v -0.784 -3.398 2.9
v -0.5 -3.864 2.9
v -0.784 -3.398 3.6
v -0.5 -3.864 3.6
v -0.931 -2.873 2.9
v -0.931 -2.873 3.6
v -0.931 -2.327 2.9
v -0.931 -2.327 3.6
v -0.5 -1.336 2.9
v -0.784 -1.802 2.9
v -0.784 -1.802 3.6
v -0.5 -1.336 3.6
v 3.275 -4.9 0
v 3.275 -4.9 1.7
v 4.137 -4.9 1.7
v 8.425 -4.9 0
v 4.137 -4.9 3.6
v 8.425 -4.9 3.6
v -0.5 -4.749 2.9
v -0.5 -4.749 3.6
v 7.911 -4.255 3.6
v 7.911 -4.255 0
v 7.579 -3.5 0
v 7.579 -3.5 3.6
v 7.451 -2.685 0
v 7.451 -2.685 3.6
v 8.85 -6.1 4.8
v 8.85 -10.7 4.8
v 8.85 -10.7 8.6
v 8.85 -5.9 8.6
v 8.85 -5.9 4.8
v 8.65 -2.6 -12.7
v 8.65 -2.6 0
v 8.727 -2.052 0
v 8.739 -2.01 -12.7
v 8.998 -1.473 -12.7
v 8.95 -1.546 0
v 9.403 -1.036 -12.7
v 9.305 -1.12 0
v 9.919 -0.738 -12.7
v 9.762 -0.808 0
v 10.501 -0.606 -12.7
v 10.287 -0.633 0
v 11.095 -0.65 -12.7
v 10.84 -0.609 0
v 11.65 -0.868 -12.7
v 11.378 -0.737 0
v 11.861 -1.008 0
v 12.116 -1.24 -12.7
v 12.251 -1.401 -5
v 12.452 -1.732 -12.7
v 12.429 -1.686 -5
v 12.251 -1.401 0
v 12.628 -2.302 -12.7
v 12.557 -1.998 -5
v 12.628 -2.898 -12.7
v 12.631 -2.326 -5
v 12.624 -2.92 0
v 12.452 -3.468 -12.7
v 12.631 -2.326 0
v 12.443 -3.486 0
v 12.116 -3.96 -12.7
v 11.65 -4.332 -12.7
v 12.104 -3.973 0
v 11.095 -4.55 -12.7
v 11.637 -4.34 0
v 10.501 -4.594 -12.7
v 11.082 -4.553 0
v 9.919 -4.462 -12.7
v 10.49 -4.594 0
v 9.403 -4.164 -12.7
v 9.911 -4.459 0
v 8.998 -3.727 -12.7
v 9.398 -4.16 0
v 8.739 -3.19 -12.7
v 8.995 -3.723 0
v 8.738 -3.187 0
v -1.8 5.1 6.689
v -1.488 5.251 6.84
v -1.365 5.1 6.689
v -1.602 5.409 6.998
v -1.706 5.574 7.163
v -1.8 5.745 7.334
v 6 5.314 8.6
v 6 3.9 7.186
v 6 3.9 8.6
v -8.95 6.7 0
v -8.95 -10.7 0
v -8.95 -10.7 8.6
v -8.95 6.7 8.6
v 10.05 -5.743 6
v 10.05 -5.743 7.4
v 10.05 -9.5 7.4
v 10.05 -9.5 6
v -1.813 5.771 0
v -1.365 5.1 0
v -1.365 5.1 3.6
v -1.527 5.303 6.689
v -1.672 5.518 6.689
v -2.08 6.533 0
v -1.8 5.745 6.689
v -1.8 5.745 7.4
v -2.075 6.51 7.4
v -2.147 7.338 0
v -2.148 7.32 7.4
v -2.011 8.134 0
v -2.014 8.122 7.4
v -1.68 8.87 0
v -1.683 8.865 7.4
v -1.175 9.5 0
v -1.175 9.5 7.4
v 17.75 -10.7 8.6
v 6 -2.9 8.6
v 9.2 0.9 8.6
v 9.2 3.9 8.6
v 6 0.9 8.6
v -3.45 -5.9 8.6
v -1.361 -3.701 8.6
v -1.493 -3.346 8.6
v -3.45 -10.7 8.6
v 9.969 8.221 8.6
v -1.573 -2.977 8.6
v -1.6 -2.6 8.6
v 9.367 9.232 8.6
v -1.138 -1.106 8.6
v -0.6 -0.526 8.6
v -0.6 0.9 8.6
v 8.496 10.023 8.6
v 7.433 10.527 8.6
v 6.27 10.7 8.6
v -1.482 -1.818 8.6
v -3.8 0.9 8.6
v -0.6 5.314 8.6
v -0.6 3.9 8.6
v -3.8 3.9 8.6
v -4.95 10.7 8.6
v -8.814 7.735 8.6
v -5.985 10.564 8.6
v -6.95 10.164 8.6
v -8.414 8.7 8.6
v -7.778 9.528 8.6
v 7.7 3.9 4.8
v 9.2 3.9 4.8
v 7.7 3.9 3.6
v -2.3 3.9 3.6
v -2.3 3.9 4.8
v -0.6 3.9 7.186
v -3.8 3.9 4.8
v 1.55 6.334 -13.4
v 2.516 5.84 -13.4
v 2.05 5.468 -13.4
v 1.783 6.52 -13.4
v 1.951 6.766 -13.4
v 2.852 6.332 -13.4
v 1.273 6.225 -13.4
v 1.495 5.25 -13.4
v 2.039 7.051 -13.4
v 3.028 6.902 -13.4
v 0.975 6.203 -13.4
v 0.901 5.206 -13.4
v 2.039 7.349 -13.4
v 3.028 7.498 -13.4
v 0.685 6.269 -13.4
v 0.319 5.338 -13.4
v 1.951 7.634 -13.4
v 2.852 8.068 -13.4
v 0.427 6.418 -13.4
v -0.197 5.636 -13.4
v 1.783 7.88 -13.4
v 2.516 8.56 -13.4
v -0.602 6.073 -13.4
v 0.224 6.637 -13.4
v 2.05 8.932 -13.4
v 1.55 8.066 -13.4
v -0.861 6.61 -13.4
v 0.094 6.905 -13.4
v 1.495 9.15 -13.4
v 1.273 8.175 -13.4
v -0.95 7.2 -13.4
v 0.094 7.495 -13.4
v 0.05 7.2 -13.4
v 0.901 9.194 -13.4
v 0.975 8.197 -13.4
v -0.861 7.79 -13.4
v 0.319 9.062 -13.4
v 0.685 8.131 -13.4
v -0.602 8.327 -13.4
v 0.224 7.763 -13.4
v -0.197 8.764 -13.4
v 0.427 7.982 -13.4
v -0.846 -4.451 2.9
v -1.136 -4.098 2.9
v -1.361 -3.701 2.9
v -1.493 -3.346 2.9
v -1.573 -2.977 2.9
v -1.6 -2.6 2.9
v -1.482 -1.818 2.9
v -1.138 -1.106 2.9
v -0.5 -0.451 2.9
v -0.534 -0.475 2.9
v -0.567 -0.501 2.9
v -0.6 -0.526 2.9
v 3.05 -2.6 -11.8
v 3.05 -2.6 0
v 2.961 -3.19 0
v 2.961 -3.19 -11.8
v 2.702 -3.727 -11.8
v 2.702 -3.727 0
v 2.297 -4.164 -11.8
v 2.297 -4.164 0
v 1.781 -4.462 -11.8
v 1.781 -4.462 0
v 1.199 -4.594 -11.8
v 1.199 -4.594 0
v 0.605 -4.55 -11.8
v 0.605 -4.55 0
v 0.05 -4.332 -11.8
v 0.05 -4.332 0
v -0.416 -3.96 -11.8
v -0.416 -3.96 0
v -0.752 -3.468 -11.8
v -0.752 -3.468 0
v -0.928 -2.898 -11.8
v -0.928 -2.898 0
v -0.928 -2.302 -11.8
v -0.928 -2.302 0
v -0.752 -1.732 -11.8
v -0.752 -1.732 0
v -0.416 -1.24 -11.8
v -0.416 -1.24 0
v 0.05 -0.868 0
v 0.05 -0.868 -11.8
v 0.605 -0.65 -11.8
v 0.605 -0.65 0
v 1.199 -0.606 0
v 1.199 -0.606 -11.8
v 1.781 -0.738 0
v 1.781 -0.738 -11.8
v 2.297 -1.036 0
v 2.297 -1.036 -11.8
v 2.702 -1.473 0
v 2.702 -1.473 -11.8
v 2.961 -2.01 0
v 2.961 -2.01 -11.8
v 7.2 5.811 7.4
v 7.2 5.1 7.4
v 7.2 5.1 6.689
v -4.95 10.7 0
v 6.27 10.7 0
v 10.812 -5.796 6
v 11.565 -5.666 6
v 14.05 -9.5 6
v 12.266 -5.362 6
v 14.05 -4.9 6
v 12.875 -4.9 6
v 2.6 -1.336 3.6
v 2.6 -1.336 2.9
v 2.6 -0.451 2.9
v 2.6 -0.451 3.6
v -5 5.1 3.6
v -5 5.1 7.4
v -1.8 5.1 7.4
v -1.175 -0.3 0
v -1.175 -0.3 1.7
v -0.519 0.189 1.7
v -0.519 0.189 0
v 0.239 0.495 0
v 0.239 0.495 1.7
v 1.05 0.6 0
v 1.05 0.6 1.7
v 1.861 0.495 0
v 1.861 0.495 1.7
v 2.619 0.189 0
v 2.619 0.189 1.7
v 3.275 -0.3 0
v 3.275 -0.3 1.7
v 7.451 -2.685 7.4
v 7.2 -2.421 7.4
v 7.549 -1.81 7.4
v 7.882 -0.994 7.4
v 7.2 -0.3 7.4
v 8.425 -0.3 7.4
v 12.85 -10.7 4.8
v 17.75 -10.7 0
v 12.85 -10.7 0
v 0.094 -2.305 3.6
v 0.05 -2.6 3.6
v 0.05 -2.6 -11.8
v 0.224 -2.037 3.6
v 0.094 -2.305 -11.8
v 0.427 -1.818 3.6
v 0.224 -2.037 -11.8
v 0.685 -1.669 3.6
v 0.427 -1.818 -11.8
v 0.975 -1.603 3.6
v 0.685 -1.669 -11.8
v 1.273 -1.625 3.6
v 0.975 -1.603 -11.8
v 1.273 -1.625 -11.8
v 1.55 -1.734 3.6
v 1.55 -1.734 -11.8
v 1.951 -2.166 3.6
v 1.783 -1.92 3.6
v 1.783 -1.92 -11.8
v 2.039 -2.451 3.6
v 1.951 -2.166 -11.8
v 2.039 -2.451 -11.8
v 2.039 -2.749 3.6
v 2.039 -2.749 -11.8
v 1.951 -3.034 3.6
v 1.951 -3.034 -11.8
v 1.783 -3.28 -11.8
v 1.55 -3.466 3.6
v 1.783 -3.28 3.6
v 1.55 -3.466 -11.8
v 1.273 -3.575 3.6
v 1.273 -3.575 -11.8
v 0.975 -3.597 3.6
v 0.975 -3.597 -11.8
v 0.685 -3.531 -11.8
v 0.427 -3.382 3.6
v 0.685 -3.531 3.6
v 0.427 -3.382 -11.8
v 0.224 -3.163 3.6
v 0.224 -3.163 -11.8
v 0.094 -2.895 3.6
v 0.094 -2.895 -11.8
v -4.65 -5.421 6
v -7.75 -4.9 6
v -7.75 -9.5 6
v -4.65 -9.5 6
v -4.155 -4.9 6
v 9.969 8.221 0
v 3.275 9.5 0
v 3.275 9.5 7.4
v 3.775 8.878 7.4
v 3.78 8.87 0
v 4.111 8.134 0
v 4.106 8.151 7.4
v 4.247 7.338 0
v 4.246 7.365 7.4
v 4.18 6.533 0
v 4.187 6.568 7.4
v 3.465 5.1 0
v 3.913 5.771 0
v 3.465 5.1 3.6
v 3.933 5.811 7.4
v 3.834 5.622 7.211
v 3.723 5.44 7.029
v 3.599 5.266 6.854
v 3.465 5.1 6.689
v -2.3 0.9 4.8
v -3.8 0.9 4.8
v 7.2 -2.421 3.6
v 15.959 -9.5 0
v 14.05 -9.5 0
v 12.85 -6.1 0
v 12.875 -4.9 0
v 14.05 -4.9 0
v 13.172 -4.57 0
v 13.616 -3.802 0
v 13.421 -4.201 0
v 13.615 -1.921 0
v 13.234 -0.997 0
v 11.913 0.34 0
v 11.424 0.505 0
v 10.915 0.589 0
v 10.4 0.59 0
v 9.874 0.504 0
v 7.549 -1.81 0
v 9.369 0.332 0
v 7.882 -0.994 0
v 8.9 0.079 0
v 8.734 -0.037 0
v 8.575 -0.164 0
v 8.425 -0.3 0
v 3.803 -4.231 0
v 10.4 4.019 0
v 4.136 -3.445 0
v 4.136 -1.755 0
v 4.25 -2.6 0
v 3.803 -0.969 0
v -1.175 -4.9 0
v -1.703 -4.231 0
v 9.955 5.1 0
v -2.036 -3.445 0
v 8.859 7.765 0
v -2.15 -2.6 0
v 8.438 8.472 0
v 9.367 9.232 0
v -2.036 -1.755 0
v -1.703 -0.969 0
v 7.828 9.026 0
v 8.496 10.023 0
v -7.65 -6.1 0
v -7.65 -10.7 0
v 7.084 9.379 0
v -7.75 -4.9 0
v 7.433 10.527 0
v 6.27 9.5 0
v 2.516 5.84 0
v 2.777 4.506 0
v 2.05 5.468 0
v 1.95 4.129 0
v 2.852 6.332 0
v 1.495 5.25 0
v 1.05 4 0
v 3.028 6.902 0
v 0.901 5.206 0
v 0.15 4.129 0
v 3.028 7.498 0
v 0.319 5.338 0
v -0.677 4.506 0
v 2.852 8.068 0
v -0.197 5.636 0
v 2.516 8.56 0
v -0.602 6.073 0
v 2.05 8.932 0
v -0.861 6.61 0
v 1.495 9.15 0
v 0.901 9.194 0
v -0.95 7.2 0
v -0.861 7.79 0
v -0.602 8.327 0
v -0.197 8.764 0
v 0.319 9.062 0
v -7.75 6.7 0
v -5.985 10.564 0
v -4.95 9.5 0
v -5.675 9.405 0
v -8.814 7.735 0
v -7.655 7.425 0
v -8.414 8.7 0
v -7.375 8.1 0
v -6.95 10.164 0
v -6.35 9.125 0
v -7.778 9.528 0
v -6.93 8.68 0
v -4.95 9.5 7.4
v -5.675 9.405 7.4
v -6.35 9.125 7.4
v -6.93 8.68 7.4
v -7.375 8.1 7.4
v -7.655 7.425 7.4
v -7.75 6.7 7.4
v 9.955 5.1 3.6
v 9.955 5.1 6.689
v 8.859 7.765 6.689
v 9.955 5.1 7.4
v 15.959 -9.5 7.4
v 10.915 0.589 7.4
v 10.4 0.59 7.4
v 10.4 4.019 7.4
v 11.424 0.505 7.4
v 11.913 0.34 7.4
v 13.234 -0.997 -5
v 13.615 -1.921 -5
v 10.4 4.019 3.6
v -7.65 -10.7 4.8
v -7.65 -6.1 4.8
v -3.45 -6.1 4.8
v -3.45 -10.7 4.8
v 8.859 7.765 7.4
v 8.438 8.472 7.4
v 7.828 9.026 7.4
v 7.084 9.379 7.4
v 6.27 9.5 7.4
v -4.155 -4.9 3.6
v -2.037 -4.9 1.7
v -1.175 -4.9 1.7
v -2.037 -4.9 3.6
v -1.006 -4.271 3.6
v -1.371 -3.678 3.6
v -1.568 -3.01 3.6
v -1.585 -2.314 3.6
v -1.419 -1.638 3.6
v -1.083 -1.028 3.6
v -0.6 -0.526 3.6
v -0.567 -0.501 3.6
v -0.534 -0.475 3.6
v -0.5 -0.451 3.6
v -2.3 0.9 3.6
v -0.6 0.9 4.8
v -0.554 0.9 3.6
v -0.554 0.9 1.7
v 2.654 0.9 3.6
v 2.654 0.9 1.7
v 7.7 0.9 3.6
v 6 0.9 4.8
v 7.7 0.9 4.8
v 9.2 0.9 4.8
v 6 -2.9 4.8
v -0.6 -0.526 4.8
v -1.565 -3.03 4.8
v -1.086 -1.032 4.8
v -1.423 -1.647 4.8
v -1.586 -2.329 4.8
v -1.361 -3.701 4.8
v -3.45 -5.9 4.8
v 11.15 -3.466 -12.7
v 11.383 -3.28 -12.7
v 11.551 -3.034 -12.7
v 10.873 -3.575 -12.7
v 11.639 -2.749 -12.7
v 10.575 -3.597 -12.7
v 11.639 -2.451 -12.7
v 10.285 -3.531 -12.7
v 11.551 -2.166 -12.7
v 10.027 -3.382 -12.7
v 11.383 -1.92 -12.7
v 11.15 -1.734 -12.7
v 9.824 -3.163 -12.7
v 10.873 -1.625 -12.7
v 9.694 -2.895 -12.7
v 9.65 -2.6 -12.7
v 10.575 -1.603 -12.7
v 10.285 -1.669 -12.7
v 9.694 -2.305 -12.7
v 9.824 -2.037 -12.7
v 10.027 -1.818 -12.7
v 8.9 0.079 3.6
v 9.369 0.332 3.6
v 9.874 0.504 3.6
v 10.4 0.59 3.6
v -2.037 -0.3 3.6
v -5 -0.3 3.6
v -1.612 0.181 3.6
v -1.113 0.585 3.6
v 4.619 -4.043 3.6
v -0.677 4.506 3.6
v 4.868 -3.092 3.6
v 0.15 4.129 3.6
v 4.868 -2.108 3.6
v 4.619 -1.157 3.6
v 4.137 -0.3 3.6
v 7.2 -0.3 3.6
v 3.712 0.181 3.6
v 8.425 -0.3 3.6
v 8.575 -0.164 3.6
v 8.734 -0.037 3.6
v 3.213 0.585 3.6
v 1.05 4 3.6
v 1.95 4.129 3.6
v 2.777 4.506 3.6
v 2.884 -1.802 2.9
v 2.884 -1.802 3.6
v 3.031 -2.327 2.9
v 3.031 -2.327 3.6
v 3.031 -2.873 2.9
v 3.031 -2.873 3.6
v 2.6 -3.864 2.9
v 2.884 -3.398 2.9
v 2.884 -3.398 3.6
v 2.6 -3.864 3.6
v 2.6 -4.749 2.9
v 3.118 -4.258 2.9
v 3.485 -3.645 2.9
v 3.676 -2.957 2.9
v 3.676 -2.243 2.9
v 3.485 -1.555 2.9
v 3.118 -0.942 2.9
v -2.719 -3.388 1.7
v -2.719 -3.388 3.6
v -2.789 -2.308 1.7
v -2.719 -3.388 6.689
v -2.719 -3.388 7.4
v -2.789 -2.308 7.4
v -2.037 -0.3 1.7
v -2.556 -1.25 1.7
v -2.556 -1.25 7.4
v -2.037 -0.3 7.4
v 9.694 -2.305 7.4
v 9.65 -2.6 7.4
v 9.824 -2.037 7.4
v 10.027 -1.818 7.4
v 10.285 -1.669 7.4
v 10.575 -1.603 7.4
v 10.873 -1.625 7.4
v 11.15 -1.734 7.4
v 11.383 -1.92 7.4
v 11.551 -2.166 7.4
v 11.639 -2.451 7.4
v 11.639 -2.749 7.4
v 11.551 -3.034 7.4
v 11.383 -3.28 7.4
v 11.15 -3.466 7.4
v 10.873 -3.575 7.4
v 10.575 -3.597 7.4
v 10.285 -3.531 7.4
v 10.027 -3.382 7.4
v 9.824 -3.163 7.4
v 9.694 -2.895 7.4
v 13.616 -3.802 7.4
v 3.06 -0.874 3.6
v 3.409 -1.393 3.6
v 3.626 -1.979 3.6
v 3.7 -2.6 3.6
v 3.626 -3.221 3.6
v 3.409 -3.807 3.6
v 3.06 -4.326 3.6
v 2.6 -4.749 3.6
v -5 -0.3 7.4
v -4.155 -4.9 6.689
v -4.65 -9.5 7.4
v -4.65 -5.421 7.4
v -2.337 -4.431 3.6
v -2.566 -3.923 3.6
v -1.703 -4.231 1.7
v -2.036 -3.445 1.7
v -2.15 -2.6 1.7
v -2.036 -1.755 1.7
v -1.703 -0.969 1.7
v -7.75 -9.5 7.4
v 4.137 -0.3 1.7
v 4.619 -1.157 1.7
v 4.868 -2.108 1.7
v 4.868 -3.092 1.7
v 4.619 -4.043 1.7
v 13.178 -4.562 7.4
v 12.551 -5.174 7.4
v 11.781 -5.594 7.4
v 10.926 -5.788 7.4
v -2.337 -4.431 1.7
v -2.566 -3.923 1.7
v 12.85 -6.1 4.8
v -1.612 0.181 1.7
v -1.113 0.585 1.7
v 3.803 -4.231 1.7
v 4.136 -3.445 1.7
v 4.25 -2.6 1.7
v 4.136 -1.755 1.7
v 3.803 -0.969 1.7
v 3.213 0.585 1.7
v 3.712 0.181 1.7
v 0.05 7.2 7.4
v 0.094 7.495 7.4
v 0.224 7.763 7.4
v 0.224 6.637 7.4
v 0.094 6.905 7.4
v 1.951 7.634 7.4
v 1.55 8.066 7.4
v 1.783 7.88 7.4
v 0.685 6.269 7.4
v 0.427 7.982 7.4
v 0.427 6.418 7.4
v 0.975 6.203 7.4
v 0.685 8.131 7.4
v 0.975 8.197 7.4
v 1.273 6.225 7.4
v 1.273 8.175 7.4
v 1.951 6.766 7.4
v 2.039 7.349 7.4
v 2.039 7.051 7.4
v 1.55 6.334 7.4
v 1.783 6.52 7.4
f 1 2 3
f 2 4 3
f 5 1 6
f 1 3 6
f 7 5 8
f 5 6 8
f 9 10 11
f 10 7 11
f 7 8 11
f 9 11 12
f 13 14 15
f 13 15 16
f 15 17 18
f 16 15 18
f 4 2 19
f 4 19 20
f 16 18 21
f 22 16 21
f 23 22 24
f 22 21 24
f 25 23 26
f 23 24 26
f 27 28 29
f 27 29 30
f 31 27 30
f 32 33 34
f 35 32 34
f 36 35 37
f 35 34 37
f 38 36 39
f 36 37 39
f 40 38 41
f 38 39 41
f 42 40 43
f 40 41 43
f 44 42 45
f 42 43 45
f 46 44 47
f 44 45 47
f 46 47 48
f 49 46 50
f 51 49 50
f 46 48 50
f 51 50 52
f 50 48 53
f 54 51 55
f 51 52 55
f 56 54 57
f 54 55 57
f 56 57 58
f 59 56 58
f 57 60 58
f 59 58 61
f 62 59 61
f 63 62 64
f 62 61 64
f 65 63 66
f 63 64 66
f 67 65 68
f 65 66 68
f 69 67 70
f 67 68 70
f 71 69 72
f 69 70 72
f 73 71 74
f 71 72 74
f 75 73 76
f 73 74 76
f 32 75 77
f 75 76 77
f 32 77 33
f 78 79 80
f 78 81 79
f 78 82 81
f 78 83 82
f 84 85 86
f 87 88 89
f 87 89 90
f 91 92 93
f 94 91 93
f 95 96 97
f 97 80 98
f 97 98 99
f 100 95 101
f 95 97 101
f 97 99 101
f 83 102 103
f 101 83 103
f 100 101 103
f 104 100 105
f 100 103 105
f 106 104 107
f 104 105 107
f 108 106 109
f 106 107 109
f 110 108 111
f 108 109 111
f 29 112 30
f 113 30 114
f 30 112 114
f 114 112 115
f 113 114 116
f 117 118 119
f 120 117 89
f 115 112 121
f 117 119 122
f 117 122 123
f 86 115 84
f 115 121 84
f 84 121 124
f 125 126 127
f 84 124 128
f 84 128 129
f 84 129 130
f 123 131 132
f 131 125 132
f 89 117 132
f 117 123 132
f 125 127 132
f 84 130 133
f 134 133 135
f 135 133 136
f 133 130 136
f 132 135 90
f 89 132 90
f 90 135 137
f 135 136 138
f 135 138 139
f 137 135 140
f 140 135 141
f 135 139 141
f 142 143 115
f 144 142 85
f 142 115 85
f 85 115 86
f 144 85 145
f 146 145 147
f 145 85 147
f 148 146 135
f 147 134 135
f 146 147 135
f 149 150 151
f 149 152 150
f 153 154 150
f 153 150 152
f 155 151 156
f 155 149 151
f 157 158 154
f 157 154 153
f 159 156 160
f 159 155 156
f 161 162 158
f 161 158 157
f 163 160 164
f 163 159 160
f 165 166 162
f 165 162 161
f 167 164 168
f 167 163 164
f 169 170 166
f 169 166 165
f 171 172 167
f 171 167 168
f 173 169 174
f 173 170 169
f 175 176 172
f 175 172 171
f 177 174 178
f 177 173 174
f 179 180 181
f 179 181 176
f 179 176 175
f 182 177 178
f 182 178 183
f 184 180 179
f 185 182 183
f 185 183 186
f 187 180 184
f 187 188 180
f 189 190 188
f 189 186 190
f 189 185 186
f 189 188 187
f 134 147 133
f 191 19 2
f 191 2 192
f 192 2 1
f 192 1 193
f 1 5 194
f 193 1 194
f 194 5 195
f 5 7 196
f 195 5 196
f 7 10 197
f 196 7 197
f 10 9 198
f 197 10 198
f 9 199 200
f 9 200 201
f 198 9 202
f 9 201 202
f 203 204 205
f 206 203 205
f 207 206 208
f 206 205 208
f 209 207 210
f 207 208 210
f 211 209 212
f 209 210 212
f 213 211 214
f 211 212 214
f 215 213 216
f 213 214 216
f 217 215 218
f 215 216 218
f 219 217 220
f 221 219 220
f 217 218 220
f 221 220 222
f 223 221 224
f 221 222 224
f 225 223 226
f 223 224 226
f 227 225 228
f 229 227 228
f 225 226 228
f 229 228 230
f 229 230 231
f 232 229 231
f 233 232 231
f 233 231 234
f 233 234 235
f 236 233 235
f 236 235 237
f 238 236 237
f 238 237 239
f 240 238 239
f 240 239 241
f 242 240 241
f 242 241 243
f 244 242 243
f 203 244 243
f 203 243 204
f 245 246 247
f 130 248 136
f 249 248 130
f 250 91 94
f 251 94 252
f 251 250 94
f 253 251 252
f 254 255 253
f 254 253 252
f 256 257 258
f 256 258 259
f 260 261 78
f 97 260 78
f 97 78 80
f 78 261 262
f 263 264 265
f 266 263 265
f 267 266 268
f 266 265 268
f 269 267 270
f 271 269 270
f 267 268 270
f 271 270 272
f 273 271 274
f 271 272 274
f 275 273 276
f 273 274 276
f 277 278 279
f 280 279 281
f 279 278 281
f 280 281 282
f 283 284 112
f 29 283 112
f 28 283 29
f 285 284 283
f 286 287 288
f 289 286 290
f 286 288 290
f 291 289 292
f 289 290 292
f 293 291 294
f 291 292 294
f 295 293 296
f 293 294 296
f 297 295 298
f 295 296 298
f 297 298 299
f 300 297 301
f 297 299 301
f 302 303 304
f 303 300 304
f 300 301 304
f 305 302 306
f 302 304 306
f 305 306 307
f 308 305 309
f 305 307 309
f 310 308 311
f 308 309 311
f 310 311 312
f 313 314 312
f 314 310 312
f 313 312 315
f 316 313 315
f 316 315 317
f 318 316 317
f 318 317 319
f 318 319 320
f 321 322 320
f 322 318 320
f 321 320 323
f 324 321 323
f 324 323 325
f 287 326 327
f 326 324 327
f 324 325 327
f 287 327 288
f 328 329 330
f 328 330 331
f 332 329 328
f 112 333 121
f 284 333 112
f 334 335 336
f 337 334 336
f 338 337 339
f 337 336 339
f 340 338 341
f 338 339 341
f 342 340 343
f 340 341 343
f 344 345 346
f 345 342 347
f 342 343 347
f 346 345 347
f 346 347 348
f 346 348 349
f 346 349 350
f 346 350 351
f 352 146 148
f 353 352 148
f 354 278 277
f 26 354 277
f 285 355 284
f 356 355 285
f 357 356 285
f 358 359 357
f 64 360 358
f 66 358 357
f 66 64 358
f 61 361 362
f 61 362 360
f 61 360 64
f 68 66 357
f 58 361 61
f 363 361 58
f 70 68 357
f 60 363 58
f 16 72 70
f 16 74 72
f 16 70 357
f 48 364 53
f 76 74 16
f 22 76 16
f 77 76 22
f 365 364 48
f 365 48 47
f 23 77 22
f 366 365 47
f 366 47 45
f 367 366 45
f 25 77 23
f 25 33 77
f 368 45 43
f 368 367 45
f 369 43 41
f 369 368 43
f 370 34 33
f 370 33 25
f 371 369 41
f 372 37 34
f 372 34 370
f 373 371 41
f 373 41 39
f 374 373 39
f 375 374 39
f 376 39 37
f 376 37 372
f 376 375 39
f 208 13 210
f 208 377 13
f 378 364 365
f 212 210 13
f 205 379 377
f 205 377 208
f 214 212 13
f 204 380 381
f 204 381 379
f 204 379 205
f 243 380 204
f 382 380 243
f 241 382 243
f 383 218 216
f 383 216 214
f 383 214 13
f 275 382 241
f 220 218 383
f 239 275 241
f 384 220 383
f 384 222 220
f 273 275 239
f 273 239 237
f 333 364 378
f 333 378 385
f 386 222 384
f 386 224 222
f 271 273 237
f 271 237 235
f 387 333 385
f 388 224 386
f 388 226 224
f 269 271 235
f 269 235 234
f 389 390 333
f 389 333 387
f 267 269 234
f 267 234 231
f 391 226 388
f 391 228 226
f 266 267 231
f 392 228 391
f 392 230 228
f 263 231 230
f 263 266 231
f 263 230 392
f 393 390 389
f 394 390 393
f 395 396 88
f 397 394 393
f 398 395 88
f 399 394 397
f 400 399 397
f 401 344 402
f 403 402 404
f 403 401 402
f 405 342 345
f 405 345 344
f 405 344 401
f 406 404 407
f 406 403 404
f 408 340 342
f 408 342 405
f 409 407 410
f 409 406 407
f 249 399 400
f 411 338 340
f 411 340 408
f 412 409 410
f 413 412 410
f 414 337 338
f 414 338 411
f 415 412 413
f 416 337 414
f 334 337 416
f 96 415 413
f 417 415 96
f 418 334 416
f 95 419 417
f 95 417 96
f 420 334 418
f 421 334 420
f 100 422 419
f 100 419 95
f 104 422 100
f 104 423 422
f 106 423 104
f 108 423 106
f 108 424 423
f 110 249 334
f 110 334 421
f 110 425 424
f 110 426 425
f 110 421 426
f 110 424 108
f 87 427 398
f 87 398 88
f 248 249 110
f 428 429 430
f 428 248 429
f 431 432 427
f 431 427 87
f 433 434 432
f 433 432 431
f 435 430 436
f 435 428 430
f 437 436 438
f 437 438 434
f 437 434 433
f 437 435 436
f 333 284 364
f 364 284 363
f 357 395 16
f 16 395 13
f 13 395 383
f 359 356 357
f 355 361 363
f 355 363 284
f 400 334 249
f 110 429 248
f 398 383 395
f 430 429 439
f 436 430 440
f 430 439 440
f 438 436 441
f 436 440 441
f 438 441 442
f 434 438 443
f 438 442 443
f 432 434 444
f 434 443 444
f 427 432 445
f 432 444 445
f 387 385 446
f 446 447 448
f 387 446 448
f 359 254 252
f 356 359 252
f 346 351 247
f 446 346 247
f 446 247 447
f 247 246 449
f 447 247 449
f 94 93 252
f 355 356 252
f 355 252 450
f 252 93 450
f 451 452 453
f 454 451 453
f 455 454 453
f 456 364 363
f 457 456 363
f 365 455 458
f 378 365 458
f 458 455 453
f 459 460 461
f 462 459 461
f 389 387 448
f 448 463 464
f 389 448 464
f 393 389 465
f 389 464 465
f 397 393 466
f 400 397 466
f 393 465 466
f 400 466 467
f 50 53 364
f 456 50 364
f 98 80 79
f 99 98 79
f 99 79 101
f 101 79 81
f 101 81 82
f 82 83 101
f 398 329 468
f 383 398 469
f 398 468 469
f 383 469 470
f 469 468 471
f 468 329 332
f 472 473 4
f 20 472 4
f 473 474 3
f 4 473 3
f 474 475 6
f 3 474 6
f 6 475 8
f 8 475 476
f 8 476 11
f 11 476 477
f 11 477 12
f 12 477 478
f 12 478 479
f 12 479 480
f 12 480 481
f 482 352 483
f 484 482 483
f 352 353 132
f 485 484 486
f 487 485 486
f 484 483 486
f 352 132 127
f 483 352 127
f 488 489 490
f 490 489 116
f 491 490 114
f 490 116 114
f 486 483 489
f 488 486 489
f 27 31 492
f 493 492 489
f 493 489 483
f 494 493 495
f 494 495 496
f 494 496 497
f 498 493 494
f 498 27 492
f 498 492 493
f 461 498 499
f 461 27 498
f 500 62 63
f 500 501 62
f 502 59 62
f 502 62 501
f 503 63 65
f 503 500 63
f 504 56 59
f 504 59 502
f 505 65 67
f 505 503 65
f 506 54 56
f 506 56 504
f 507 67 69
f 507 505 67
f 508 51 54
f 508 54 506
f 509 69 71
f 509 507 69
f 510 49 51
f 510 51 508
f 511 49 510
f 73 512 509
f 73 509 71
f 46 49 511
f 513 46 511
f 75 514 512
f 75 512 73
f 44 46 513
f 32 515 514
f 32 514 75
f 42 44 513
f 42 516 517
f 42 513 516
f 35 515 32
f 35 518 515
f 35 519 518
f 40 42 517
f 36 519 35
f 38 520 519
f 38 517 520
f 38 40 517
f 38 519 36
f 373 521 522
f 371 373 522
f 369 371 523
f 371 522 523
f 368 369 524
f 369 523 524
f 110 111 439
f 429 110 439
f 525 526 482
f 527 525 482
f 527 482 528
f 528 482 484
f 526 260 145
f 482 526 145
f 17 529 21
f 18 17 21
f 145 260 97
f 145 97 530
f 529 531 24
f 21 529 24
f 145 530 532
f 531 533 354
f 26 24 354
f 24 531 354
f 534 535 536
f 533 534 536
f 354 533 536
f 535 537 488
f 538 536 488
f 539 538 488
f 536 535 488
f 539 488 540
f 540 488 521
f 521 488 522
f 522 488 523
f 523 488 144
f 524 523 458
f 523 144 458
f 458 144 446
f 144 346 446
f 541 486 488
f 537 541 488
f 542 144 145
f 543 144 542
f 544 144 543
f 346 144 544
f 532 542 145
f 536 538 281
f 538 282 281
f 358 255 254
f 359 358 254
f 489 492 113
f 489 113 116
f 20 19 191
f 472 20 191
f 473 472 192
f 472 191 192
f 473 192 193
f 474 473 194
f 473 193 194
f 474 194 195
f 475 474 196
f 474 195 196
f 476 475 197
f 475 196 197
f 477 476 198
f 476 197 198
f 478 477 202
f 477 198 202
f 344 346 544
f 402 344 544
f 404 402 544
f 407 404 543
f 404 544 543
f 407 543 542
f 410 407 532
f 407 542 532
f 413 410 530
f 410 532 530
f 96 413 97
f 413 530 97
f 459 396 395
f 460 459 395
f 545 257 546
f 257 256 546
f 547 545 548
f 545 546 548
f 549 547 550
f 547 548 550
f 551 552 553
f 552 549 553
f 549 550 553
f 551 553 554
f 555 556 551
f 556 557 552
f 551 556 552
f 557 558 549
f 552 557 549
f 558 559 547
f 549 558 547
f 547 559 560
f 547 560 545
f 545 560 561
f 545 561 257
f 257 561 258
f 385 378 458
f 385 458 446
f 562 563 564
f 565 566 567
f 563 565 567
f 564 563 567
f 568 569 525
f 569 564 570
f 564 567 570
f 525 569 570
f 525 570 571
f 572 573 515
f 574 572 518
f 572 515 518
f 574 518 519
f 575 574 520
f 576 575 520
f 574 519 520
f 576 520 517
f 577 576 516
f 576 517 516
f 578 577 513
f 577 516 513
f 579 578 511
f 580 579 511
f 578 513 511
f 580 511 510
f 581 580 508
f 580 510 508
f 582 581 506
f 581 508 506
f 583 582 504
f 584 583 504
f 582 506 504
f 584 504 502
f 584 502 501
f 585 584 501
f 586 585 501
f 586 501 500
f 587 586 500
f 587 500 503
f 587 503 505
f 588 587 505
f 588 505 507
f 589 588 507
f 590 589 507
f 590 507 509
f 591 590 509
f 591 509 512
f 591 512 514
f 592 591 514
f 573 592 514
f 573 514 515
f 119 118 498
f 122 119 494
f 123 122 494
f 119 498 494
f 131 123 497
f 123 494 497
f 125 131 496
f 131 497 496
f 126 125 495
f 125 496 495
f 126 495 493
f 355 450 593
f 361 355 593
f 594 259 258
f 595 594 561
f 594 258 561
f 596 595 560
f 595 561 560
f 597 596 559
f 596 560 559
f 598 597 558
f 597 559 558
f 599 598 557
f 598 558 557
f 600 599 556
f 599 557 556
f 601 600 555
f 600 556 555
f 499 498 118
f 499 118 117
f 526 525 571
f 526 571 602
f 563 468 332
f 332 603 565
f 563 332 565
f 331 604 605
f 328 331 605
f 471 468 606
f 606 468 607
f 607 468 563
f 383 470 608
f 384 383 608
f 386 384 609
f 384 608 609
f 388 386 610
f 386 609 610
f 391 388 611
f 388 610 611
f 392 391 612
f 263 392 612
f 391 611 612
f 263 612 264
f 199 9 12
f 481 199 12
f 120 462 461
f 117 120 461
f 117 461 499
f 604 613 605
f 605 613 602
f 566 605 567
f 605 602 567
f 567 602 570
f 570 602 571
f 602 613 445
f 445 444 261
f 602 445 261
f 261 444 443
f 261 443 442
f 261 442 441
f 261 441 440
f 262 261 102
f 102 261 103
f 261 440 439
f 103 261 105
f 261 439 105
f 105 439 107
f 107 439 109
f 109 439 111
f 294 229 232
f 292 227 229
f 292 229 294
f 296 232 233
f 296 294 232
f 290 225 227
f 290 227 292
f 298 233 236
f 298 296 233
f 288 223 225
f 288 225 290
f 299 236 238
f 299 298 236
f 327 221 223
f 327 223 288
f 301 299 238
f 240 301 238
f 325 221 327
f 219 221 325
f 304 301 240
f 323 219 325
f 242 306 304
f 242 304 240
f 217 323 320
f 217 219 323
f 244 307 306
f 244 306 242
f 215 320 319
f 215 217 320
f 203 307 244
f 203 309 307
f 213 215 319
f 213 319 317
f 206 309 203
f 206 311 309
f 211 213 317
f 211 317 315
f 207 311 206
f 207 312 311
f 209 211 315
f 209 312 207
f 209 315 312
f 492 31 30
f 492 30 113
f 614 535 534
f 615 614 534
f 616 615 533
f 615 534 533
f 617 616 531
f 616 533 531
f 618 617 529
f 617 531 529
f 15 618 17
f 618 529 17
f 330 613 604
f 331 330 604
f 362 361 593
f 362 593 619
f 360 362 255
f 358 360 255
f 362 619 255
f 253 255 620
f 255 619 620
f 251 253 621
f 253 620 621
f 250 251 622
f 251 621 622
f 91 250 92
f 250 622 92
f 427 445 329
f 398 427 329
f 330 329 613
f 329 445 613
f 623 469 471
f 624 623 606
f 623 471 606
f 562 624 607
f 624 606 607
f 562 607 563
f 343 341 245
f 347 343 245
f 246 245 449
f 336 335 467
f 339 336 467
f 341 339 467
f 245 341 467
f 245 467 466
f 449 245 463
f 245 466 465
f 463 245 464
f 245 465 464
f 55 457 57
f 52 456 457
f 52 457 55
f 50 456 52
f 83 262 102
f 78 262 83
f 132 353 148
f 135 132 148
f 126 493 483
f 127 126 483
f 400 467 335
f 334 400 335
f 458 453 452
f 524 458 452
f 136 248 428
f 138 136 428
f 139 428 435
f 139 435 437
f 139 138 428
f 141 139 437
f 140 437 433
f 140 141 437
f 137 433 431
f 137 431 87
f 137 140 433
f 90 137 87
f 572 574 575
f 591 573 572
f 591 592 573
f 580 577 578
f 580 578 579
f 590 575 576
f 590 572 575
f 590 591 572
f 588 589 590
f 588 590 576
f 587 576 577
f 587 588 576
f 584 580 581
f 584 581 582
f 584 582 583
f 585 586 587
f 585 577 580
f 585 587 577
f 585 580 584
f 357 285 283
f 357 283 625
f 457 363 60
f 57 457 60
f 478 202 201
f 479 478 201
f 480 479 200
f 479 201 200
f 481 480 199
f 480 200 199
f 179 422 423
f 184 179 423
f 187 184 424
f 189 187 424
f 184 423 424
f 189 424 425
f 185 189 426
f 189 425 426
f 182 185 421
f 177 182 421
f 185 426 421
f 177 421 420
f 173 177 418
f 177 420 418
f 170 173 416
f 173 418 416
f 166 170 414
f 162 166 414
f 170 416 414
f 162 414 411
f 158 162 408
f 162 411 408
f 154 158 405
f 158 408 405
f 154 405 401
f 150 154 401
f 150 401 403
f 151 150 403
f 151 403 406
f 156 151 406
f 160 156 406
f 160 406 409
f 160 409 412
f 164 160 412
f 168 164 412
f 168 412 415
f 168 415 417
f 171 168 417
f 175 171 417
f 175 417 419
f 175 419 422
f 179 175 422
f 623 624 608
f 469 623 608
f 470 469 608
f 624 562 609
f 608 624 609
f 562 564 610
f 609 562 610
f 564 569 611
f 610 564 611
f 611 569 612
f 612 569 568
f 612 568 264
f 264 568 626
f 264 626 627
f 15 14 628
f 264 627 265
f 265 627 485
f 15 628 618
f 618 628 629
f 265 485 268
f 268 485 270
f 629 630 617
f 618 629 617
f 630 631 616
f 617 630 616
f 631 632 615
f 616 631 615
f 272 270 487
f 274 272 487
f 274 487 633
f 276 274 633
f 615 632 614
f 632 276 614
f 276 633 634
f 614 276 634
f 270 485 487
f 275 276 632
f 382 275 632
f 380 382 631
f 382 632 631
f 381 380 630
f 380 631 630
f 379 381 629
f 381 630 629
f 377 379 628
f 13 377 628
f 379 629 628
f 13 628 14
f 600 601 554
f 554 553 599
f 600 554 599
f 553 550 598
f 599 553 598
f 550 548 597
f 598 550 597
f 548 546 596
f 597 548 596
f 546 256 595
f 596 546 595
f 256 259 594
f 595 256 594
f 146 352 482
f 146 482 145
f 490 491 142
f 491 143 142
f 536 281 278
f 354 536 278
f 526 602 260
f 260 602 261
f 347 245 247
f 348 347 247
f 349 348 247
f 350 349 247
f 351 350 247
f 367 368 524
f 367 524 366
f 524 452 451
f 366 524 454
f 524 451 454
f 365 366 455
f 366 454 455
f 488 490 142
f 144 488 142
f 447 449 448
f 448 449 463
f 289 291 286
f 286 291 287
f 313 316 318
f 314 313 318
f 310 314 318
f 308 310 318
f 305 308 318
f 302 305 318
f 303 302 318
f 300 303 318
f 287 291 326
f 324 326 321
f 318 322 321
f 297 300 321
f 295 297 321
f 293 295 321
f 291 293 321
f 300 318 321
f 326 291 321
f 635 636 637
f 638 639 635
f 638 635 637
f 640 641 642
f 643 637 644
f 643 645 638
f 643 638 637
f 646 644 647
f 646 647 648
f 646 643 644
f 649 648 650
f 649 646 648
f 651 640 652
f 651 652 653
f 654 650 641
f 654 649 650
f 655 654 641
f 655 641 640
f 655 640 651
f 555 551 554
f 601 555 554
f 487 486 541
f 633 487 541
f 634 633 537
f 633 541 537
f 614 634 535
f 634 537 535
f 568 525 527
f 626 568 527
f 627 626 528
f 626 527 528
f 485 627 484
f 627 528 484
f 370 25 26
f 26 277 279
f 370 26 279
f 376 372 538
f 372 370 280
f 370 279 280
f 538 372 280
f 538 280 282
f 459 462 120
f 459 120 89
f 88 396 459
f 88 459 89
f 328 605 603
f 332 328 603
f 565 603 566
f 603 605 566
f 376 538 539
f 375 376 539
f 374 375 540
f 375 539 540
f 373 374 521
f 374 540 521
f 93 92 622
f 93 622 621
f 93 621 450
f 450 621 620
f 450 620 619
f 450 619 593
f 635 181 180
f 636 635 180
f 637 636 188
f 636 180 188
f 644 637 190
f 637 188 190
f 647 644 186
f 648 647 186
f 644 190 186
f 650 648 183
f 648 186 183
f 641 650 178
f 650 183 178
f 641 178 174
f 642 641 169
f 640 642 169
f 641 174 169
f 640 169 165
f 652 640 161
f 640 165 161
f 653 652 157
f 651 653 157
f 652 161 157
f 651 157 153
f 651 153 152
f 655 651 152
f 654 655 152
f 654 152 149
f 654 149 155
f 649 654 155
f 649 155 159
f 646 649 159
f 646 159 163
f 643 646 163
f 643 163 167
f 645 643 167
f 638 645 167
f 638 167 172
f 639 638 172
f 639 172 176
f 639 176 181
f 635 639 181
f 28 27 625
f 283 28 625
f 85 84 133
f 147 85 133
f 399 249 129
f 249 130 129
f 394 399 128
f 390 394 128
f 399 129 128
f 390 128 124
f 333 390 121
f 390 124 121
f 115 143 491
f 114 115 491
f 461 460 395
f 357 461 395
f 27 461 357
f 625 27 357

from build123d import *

# Parameters (mm, degrees)
SKETCH1_W           = 17.9
SKETCH1_H           = 21.4
SKETCH1_R           = 1
BOSS_EXTRUDE1_DEPTH = 8.6
FILLET1_R           = 4
SKETCH2_R           = 2
CUT_EXTRUDE1_DEPTH  = 1.8
CUT_EXTRUDE2_START  = -3.8
SKETCH4_R           = 2.65
SKETCH4_W           = 6.6
SKETCH4_H           = 3.8
SKETCH4_W_2         = 12.3
SKETCH4_H_2         = 4.8
CUT_EXTRUDE2_DEPTH  = 3.8
SKETCH5_W           = 10
SKETCH5_H           = 3
CUT_EXTRUDE3_DEPTH  = 22.27422149
CUT_EXTRUDE4_START  = -1.9
SKETCH6_R           = 1
CUT_EXTRUDE4_DEPTH  = 1.9
SKETCH7_W           = 20.5
SKETCH7_H           = 4.6
CUT_EXTRUDE5_DEPTH  = 4.8
SKETCH9_W           = 6.6
SKETCH9_H           = 5
CUT_EXTRUDE6_DEPTH  = 1
SKETCH3_R           = 2
CUT_EXTRUDE7_DEPTH  = 7.4
SKETCH10_R          = 3
BOSS_EXTRUDE2_DEPTH = 4.8
SKETCH11_R          = 2
CUT_EXTRUDE8_DEPTH  = 12.2
SHELL1_START        = -6.688730163
SHELL1_DEPTH        = 6.688730163
SHELL1_START_2      = -3.6
SHELL1_2_OUTLINE_W  = 1.5
SHELL1_2_OUTLINE_H  = 5.4
SHELL1_2_DEPTH      = 3.6
SHELL1_START_3      = -7.4
SHELL1_3_DEPTH      = 1.4
SHELL1_START_4      = -1.7
SHELL1_4_DEPTH      = 1.7
SHELL1_5_DEPTH      = 0.711269837
SHELL1_START_5      = -7.333566942
SHELL1_6_DEPTH      = 0.644836779
SHELL1_START_6      = 3.274859546
SHELL1_7_DEPTH      = 3.925140454
SHELL1_START_7      = -1.8
SHELL1_8_DEPTH      = 0.435460706
CUT_EXTRUDE9_START  = -3.6
CUT_EXTRUDE9_DEPTH  = 3.6
CUT_EXTRUDE10_START = -1.7
CUT_EXTRUDE10_DEPTH = 1.7
BOSS_EXTRUDE3_DEPTH = 1.2
SKETCH18_R          = 2
BOSS_EXTRUDE4_DEPTH = 20.8
SKETCH19_R          = 2
BOSS_EXTRUDE5_DEPTH = 15.4
SKETCH20_R          = 2
BOSS_EXTRUDE6_DEPTH = 20.1
CUT_EXTRUDE11_START = -4.8
SKETCH21_R          = 3
SKETCH21_R_2        = 2
CUT_EXTRUDE11_DEPTH = 4.8
BOSS_EXTRUDE7_DEPTH = 5
BOSS_EXTRUDE8_START = -7
SKETCH23_W          = 3.1
SKETCH23_H          = 0.7
BOSS_EXTRUDE8_DEPTH = 7
CUT_EXTRUDE12_REACH = 32.225
SKETCH24_R          = 1
SKETCH25_R          = 1
BOSS_EXTRUDE9_DEPTH = 1.2


with BuildPart() as part:
    # Sketch1 → Boss-Extrude1 (new body)
    # profile 1 of 2: a face of its own
    with BuildSketch(Plane.XY):
        Rectangle(SKETCH1_W, SKETCH1_H)
        with Locations((1.05, -2.6)):
            Circle(SKETCH1_R, mode=Mode.SUBTRACT)
    # profile 2 of 2: a face of its own
    with BuildSketch(Plane.XY):
        Polygon((17.75, -10.7), (8.95, -10.7), (8.95, 10.7), align=None)
    extrude(amount=-BOSS_EXTRUDE1_DEPTH)

    # Fillet1
    fillet1_edges = [part.edges().sort_by_distance(p)[0] for p in [
        (-8.95, 10.7, -4.3),
        (8.95, 10.7, -4.3),
    ]]
    fillet(fillet1_edges, radius=FILLET1_R)

    # Sketch2 → Cut-Extrude1 (cut)
    with BuildSketch(Plane.XY):
        with Locations((1.05, -2.6)):
            Circle(SKETCH2_R)
    extrude(amount=-CUT_EXTRUDE1_DEPTH, mode=Mode.SUBTRACT)

    # Sketch4 → Cut-Extrude2 (cut)
    with BuildSketch(Plane(origin=(0, 0, -8.6), x_dir=(-1, 0, 0), z_dir=(0, 0, -1)).offset(CUT_EXTRUDE2_START)):
        Polygon((-9.2, 0.9), (-6, 0.9), (0.6, 0.9), (3.8, 0.9), (3.8, 3.9), (-9.2, 3.9), align=None)
        with Locations((-1.05, -2.6)):
            Circle(SKETCH4_R)
        with Locations((-2.7, -1)):
            Rectangle(SKETCH4_W, SKETCH4_H)
        with BuildLine():
            ThreePointArc((0.6, -0.526355865), (-2.334562661, -0.28215644), (-3.682964109, -2.9))
            Line((-3.682964109, -2.9), (-2.003939201, -2.9))
            ThreePointArc((-2.003939201, -2.9), (-1.201757699, -1.611582274), (-0.05, -2.6))
            ThreePointArc((-0.05, -2.6), (-0.061582274, -2.751757699), (-0.096060799, -2.9))
            Line((-0.096060799, -2.9), (0.6, -2.9))
            Line((0.6, -2.9), (0.6, -0.526355865))
        make_face()
        with BuildLine():
            Line((-2.003939201, -2.9), (-3.682964109, -2.9))
            ThreePointArc((-3.682964109, -2.9), (-1.465474787, -5.217227675), (1.360616498, -3.700648945))
            Line((1.360616498, -3.700648945), (0.6, -2.9))
            Line((0.6, -2.9), (-0.096060799, -2.9))
            ThreePointArc((-0.096060799, -2.9), (-1.05, -3.6), (-2.003939201, -2.9))
        make_face()
        with BuildLine():
            Line((0.6, -2.9), (1.360616498, -3.700648945))
            ThreePointArc((1.360616498, -3.700648945), (1.539462658, -3.163190146), (1.6, -2.6))
            ThreePointArc((1.6, -2.6), (1.336943652, -1.448913557), (0.6, -0.526355865))
            Line((0.6, -0.526355865), (0.6, -2.9))
        make_face()
        Polygon((-6, -2.9), (0.6, -2.9), (3.45, -5.9), (-8.85, -5.9), align=None)
        with Locations((-2.7, -8.3)):
            Rectangle(SKETCH4_W_2, SKETCH4_H_2)
    extrude(amount=CUT_EXTRUDE2_DEPTH, mode=Mode.SUBTRACT)

    # Sketch5 → Cut-Extrude3 (cut, through all)
    with BuildSketch(Plane(origin=(0, 0, -4.8), x_dir=(-1, 0, 0), z_dir=(0, 0, -1))):
        with Locations((-2.7, 2.4)):
            Rectangle(SKETCH5_W, SKETCH5_H)
    extrude(amount=-CUT_EXTRUDE3_DEPTH, mode=Mode.SUBTRACT)

    # Sketch6 → Cut-Extrude4 (cut)
    # profile 1 of 5: a face of its own
    with BuildSketch(Plane(origin=(0, 0, -4.8), x_dir=(-1, 0, 0), z_dir=(0, 0, -1)).offset(CUT_EXTRUDE4_START)):
        with BuildLine():
            ThreePointArc((-2.6, -0.450581474), (-3.7, -2.6), (-2.6, -4.749418526))
            Line((-2.6, -4.749418526), (-2.6, -0.450581474))
        make_face()
    # profile 2 of 5: a face of its own
    with BuildSketch(Plane(origin=(0, 0, -4.8), x_dir=(-1, 0, 0), z_dir=(0, 0, -1)).offset(CUT_EXTRUDE4_START)):
        with BuildLine():
            Line((-2.6, -0.450581474), (-2.6, -4.749418526))
            ThreePointArc((-2.6, -4.749418526), (-1.05, -5.25), (0.5, -4.749418526))
            Line((0.5, -4.749418526), (0.5, -0.450581474))
            ThreePointArc((0.5, -0.450581474), (-1.05, 0.05), (-2.6, -0.450581474))
        make_face()
        with Locations(Location((-1.05, -2.6, 0), (0, 0, 180))):
            Circle(SKETCH6_R, mode=Mode.SUBTRACT)
    # profile 3 of 5: a face of its own
    with BuildSketch(Plane(origin=(0, 0, -4.8), x_dir=(-1, 0, 0), z_dir=(0, 0, -1)).offset(CUT_EXTRUDE4_START)):
        with BuildLine():
            Line((-2.6, 0.9), (-2.6, -0.450581474))
            ThreePointArc((-2.6, -0.450581474), (-1.05, 0.05), (0.5, -0.450581474))
            Line((0.5, -0.450581474), (0.5, 0.9))
            Line((0.5, 0.9), (-2.6, 0.9))
        make_face()
    # profile 4 of 5: a face of its own
    with BuildSketch(Plane(origin=(0, 0, -4.8), x_dir=(-1, 0, 0), z_dir=(0, 0, -1)).offset(CUT_EXTRUDE4_START)):
        with BuildLine():
            Line((0.5, -0.450581474), (0.5, -4.749418526))
            ThreePointArc((0.5, -4.749418526), (0.998560511, -4.281041294), (1.360616498, -3.700648945))
            ThreePointArc((1.360616498, -3.700648945), (1.539462658, -3.163190146), (1.6, -2.6))
            ThreePointArc((1.6, -2.6), (1.336943652, -1.448913557), (0.6, -0.526355865))
            ThreePointArc((0.6, -0.526355865), (0.550448512, -0.487876765), (0.5, -0.450581474))
        make_face()
    # profile 5 of 5: a face of its own
    with BuildSketch(Plane(origin=(0, 0, -4.8), x_dir=(-1, 0, 0), z_dir=(0, 0, -1)).offset(CUT_EXTRUDE4_START)):
        with BuildLine():
            Line((-2.6, -4.749418526), (-2.6, -6.1))
            Line((-2.6, -6.1), (0.5, -6.1))
            Line((0.5, -6.1), (0.5, -4.749418526))
            ThreePointArc((0.5, -4.749418526), (-1.05, -5.25), (-2.6, -4.749418526))
        make_face()
    extrude(amount=CUT_EXTRUDE4_DEPTH, mode=Mode.SUBTRACT)

    # Sketch7 → Cut-Extrude5 (cut)
    with BuildSketch(Plane.XY):
        with Locations((2.6, -8.4)):
            Rectangle(SKETCH7_W, SKETCH7_H)
    extrude(amount=-CUT_EXTRUDE5_DEPTH, mode=Mode.SUBTRACT)

    # Sketch9 → Cut-Extrude6 (cut)
    with BuildSketch(Plane(origin=(0, -2.35, -2.35), x_dir=(-1, 0, 0), z_dir=(0, -0.7071067811865561, -0.7071067811865389))):
        with Locations((-2.7, 9.217514421)):
            Rectangle(SKETCH9_W, SKETCH9_H)
    extrude(amount=-CUT_EXTRUDE6_DEPTH, mode=Mode.SUBTRACT)

    # Sketch3 → Cut-Extrude7 (cut)
    with BuildSketch(Plane.XY):
        with Locations((1.05, 7.2)):
            Circle(SKETCH3_R)
    extrude(amount=-CUT_EXTRUDE7_DEPTH, mode=Mode.SUBTRACT)

    # Sketch10 → Boss-Extrude2 (add)
    with BuildSketch(Plane.XY):
        with Locations((10.65, -2.6)):
            Circle(SKETCH10_R)
    extrude(amount=BOSS_EXTRUDE2_DEPTH)

    # Sketch11 → Cut-Extrude8 (cut)
    with BuildSketch(Plane.XY.offset(4.8)):
        with Locations((10.65, -2.6)):
            Circle(SKETCH11_R)
    extrude(amount=-CUT_EXTRUDE8_DEPTH, mode=Mode.SUBTRACT)

    # Shell1: read off the stored shape, not the designer's step
    # Shell1 outline → Shell1 (cut)
    with BuildSketch(Plane.XY.offset(SHELL1_START)):
        with BuildLine():
            Line((8.425140454, -0.3), (7.2, -0.3))
            Line((7.2, -0.3), (7.2, -2.420869782))
            Line((7.2, -2.420869782), (7.451135024, -2.685222439))
            ThreePointArc((7.451135024, -2.685222439), (7.687481064, -1.390255582), (8.425140454, -0.3))
        make_face()
        with BuildLine():
            Line((-4.155173707, -4.9), (-2.718545428, -3.387759707))
            ThreePointArc((-2.718545428, -3.387759707), (-2.709630033, -1.770734053), (-2.037474696, -0.3))
            Line((-2.037474696, -0.3), (-5, -0.3))
            Line((-5, -0.3), (-5, 5.1))
            Line((-5, 5.1), (-1.364539294, 5.1))
            ThreePointArc((-1.364539294, 5.1), (-2.147030716, 7.337820904), (-1.174859546, 9.5))
            Line((-1.174859546, 9.5), (-4.95, 9.5))
            ThreePointArc((-4.95, 9.5), (-6.929898987, 8.679898987), (-7.75, 6.7))
            Line((-7.75, 6.7), (-7.75, -4.9))
            Line((-7.75, -4.9), (-4.155173707, -4.9))
        make_face()
        with BuildLine():
            Line((12.874859546, -4.9), (14.05, -4.9))
            Line((14.05, -4.9), (14.05, -9.5))
            Line((14.05, -9.5), (15.959044178, -9.5))
            Line((15.959044178, -9.5), (13.615804478, -3.801667092))
            ThreePointArc((13.615804478, -3.801667092), (13.302797023, -4.389599942), (12.874859546, -4.9))
        make_face()
        with BuildLine():
            ThreePointArc((10.4, 0.590219428), (11.17143883, 0.557230043), (11.912517793, 0.340416437))
            Line((11.912517793, 0.340416437), (10.4, 4.018584707))
            Line((10.4, 4.018584707), (10.4, 0.590219428))
        make_face()
        with BuildLine():
            Line((7.2, 5.1), (9.955305861, 5.1))
            Line((9.955305861, 5.1), (8.859466499, 7.764882083))
            ThreePointArc((8.859466499, 7.764882083), (7.828444792, 9.026120142), (6.269866888, 9.5))
            Line((6.269866888, 9.5), (3.274859546, 9.5))
            ThreePointArc((3.274859546, 9.5), (4.247030716, 7.337820904), (3.464539294, 5.1))
            Line((3.464539294, 5.1), (7.2, 5.1))
        make_face()
    extrude(amount=SHELL1_DEPTH, mode=Mode.SUBTRACT)

    # Shell1 2 outline → Shell1 2 (cut)
    with BuildSketch(Plane.XY.offset(SHELL1_START_2)):
        with BuildLine():
            Line((7.2, -0.3), (4.137474696, -0.3))
            ThreePointArc((4.137474696, -0.3), (4.9, -2.6), (4.137474696, -4.9))
            Line((4.137474696, -4.9), (8.425140454, -4.9))
            ThreePointArc((8.425140454, -4.9), (7.720749783, -3.888213168), (7.451135024, -2.685222439))
            Line((7.451135024, -2.685222439), (7.2, -2.420869782))
            Line((7.2, -2.420869782), (7.2, -0.3))
        make_face()
        with BuildLine():
            Line((-4.155173707, -4.9), (-2.037474696, -4.9))
            ThreePointArc((-2.037474696, -4.9), (-2.460408902, -4.180989987), (-2.718545428, -3.387759707))
            Line((-2.718545428, -3.387759707), (-4.155173707, -4.9))
        make_face()
        with Locations((-4.25, 2.4)):
            Rectangle(SHELL1_2_OUTLINE_W, SHELL1_2_OUTLINE_H)
        with BuildLine():
            ThreePointArc((8.9, 0.079085665), (9.617859297, 0.428974342), (10.4, 0.590219428))
            Line((10.4, 0.590219428), (10.4, 4.018584707))
            Line((10.4, 4.018584707), (9.95530586, 5.1))
            Line((9.95530586, 5.1), (8.9, 5.1))
            Line((8.9, 5.1), (8.9, 0.079085665))
        make_face()
    extrude(amount=SHELL1_2_DEPTH, mode=Mode.SUBTRACT)

    # Shell1 3 outline → Shell1 3 (cut)
    with BuildSketch(Plane.XY.offset(SHELL1_START_3)):
        with BuildLine():
            Line((8.425140454, -0.3), (7.2, -0.3))
            Line((7.2, -0.3), (7.2, -2.420869782))
            Line((7.2, -2.420869782), (7.451135024, -2.685222439))
            ThreePointArc((7.451135024, -2.685222439), (7.687481064, -1.390255582), (8.425140454, -0.3))
        make_face()
        with BuildLine():
            ThreePointArc((-2.718545428, -3.387759707), (-2.709630033, -1.770734053), (-2.037474696, -0.3))
            Line((-2.037474696, -0.3), (-5, -0.3))
            Line((-5, -0.3), (-5, 5.1))
            Line((-5, 5.1), (-1.8, 5.1))
            Line((-1.8, 5.1), (-1.8, 5.744836779))
            ThreePointArc((-1.8, 5.744836779), (-2.106558657, 7.725487814), (-1.174859546, 9.5))
            Line((-1.174859546, 9.5), (-4.95, 9.5))
            ThreePointArc((-4.95, 9.5), (-6.929898987, 8.679898987), (-7.75, 6.7))
            Line((-7.75, 6.7), (-7.75, -9.5))
            Line((-7.75, -9.5), (-4.65, -9.5))
            Line((-4.65, -9.5), (-4.65, -5.420869782))
            Line((-4.65, -5.420869782), (-2.718545428, -3.387759707))
        make_face()
        with BuildLine():
            Line((10.05, -9.5), (15.959044178, -9.5))
            Line((15.959044178, -9.5), (13.615804478, -3.801667092))
            ThreePointArc((13.615804478, -3.801667092), (12.180258337, -5.410393108), (10.05, -5.743246729))
            Line((10.05, -5.743246729), (10.05, -9.5))
        make_face()
        with BuildLine():
            ThreePointArc((10.4, 0.590219428), (11.17143883, 0.557230043), (11.912517793, 0.340416437))
            Line((11.912517793, 0.340416437), (10.4, 4.018584707))
            Line((10.4, 4.018584707), (10.4, 0.590219428))
        make_face()
    extrude(amount=SHELL1_3_DEPTH, mode=Mode.SUBTRACT)

    # Shell1 4 outline → Shell1 4 (cut)
    with BuildSketch(Plane.XY.offset(SHELL1_START_4)):
        with BuildLine():
            ThreePointArc((4.137474696, -4.9), (4.9, -2.6), (4.137474696, -0.3))
            Line((4.137474696, -0.3), (3.274859546, -0.3))
            ThreePointArc((3.274859546, -0.3), (4.25, -2.6), (3.274859546, -4.9))
            Line((3.274859546, -4.9), (4.137474696, -4.9))
        make_face()
        with BuildLine():
            ThreePointArc((-2.037474696, -0.3), (-2.8, -2.6), (-2.037474696, -4.9))
            Line((-2.037474696, -4.9), (-1.174859546, -4.9))
            ThreePointArc((-1.174859546, -4.9), (-2.15, -2.6), (-1.174859546, -0.3))
            Line((-1.174859546, -0.3), (-2.037474696, -0.3))
        make_face()
    extrude(amount=SHELL1_4_DEPTH, mode=Mode.SUBTRACT)

    # Shell1 5 outline → Shell1 5 (cut)
    with BuildSketch(Plane.XY.offset(SHELL1_START_3)):
        with BuildLine():
            Line((9.95530586, 5.1), (8.859466499, 7.764882083))
            ThreePointArc((8.859466499, 7.764882083), (7.828444792, 9.026120142), (6.269866888, 9.5))
            Line((6.269866888, 9.5), (3.274859546, 9.5))
            ThreePointArc((3.274859546, 9.5), (4.247030716, 7.337820904), (3.464539294, 5.1))
            Line((3.464539294, 5.1), (7.2, 5.1))
            Line((7.2, 5.1), (9.95530586, 5.1))
        make_face()
    extrude(amount=SHELL1_5_DEPTH, mode=Mode.SUBTRACT)

    # Shell1 6 outline → Shell1 6 (cut)
    with BuildSketch(Plane.XY.offset(SHELL1_START_5)):
        with BuildLine():
            ThreePointArc((-1.364539294, 5.1), (-1.60194214, 5.409133481), (-1.8, 5.744836779))
            Line((-1.8, 5.744836779), (-1.8, 5.1))
            Line((-1.8, 5.1), (-1.364539294, 5.1))
        make_face()
    extrude(amount=SHELL1_6_DEPTH, mode=Mode.SUBTRACT)

    # Shell1 7 outline → Shell1 7 (add)
    with BuildSketch(Plane.YZ.offset(SHELL1_START_6)):
        Polygon((5.1, -7.4), (5.811269837, -7.4), (5.1, -6.688730163), align=None)
    extrude(amount=SHELL1_7_DEPTH)

    # Shell1 8 outline → Shell1 8 (add)
    with BuildSketch(Plane.YZ.offset(SHELL1_START_7)):
        Polygon((5.1, -7.333566942), (5.744836779, -7.333566942), (5.1, -6.688730163), align=None)
    extrude(amount=SHELL1_8_DEPTH)

    # Cut-Extrude9: read off the stored shape, not the designer's step
    # Cut-Extrude9 outline → Cut-Extrude9 (cut)
    with BuildSketch(Plane.XY.offset(CUT_EXTRUDE9_START)):
        with BuildLine():
            Line((7.7, 0.9), (2.653901493, 0.9))
            ThreePointArc((2.653901493, 0.9), (3.471208921, 0.393367228), (4.137474696, -0.3))
            Line((4.137474696, -0.3), (8.425140454, -0.3))
            ThreePointArc((8.425140454, -0.3), (8.653552258, -0.099160859), (8.9, 0.079085665))
            Line((8.9, 0.079085665), (8.9, 5.1))
            Line((8.9, 5.1), (3.464539294, 5.1))
            ThreePointArc((3.464539294, 5.1), (1.05, 4), (-1.364539294, 5.1))
            Line((-1.364539294, 5.1), (-3.5, 5.1))
            Line((-3.5, 5.1), (-3.5, -0.3))
            Line((-3.5, -0.3), (-2.037474696, -0.3))
            ThreePointArc((-2.037474696, -0.3), (-1.371208921, 0.393367228), (-0.553901493, 0.9))
            Line((-0.553901493, 0.9), (-2.3, 0.9))
            Line((-2.3, 0.9), (-2.3, 3.9))
            Line((-2.3, 3.9), (7.7, 3.9))
            Line((7.7, 3.9), (7.7, 0.9))
        make_face()
    extrude(amount=CUT_EXTRUDE9_DEPTH, mode=Mode.SUBTRACT)

    # Sketch15 → Cut-Extrude10 (cut)
    with BuildSketch(Plane.XY.offset(CUT_EXTRUDE10_START)):
        with BuildLine():
            ThreePointArc((-0.553901493, 0.9), (-1.371208921, 0.393367228), (-2.037474696, -0.3))
            Line((-2.037474696, -0.3), (-1.174859546, -0.3))
            ThreePointArc((-1.174859546, -0.3), (1.05, 0.6), (3.274859546, -0.3))
            Line((3.274859546, -0.3), (4.137474696, -0.3))
            ThreePointArc((4.137474696, -0.3), (3.471208921, 0.393367228), (2.653901493, 0.9))
            Line((2.653901493, 0.9), (-0.553901493, 0.9))
        make_face()
    extrude(amount=CUT_EXTRUDE10_DEPTH, mode=Mode.SUBTRACT)


with BuildPart() as body_2:
    # Mirror1: mirrored copy
    add(part.part.mirror(Plane.XY))

    # Sketch16 → Boss-Extrude3 (add)
    with BuildSketch(Plane.XY.offset(4.8)):
        with BuildLine():
            ThreePointArc((2.6, -0.450581474), (1.05, 0.05), (-0.5, -0.450581474))
            Line((-0.5, -0.450581474), (-0.5, -4.749418526))
            ThreePointArc((-0.5, -4.749418526), (1.05, -5.25), (2.6, -4.749418526))
            Line((2.6, -4.749418526), (2.6, -0.450581474))
        make_face()
        with BuildLine():
            Line((-0.5, -4.749418526), (-0.5, -0.450581474))
            ThreePointArc((-0.5, -0.450581474), (-1.6, -2.6), (-0.5, -4.749418526))
        make_face()
        with BuildLine():
            Line((2.6, 0.9), (-0.5, 0.9))
            Line((-0.5, 0.9), (-0.5, -0.450581474))
            ThreePointArc((-0.5, -0.450581474), (1.05, 0.05), (2.6, -0.450581474))
            Line((2.6, -0.450581474), (2.6, 0.9))
        make_face()
        with BuildLine():
            ThreePointArc((3.7, -2.6), (3.409025222, -1.392730353), (2.6, -0.450581474))
            Line((2.6, -0.450581474), (2.6, -4.749418526))
            ThreePointArc((2.6, -4.749418526), (3.409025222, -3.807269647), (3.7, -2.6))
        make_face()
        with BuildLine():
            ThreePointArc((2.6, -4.749418526), (1.05, -5.25), (-0.5, -4.749418526))
            Line((-0.5, -4.749418526), (-0.5, -6.1))
            Line((-0.5, -6.1), (2.6, -6.1))
            Line((2.6, -6.1), (2.6, -4.749418526))
        make_face()
    extrude(amount=-BOSS_EXTRUDE3_DEPTH)

    # Sketch18 → Boss-Extrude4 (add)
    with BuildSketch(Plane(origin=(0, 0, 7.4), x_dir=(-1, 0, 0), z_dir=(0, 0, -1))):
        with Locations((-1.05, 7.2)):
            Circle(SKETCH18_R)
    extrude(amount=BOSS_EXTRUDE4_DEPTH)

    # Sketch19 → Boss-Extrude5 (add)
    with BuildSketch(Plane(origin=(0, 0, 3.6), x_dir=(-1, 0, 0), z_dir=(0, 0, -1))):
        with Locations(Location((-1.05, -2.6, 0), (0, 0, 180))):
            Circle(SKETCH19_R)
    extrude(amount=BOSS_EXTRUDE5_DEPTH)

    # Sketch20 → Boss-Extrude6 (add)
    with BuildSketch(Plane(origin=(0, 0, 7.4), x_dir=(-1, 0, 0), z_dir=(0, 0, -1))):
        with Locations((-10.65, -2.6)):
            Circle(SKETCH20_R)
    extrude(amount=BOSS_EXTRUDE6_DEPTH)

    # Sketch21 → Cut-Extrude11 (cut)
    with BuildSketch(Plane(origin=(0, 0, -4.8), x_dir=(-1, 0, 0), z_dir=(0, 0, -1)).offset(CUT_EXTRUDE11_START)):
        with Locations((-10.65, -2.6)):
            Circle(SKETCH21_R)
        with Locations((-10.65, -2.6)):
            Circle(SKETCH21_R_2, mode=Mode.SUBTRACT)
    extrude(amount=CUT_EXTRUDE11_DEPTH, mode=Mode.SUBTRACT)

    # Sketch22 → Boss-Extrude7 (add)
    with BuildSketch(Plane(origin=(0, 0, 0), x_dir=(-1, 0, 0), z_dir=(0, 0, -1))):
        Polygon((-13.614728527, -1.921483413), (-10.840157515, -3.062428502), (-10.459842485, -2.137571498), (-13.234413498, -0.996626409), align=None)
    extrude(amount=BOSS_EXTRUDE7_DEPTH)

    # Sketch23 → Boss-Extrude8 (add)
    with BuildSketch(Plane.XZ.offset(6.1).offset(BOSS_EXTRUDE8_START)):
        with Locations((1.05, 3.25)):
            Rectangle(SKETCH23_W, SKETCH23_H)
    extrude(amount=BOSS_EXTRUDE8_DEPTH)

    # Cut-Extrude12: up to this face of the body (flat: up to its plane)
    cut_extrude12_end = Plane(body_2.part.faces().sort_by_distance((6.62629189, 7.340799544, 7.4))[0])
    # Sketch24 → Cut-Extrude12 (cut, up to the picked face)
    with BuildSketch(Plane(origin=(0, 0, -13.4), x_dir=(-1, 0, 0), z_dir=(0, 0, -1)), mode=Mode.PRIVATE) as cut_extrude12_sk1:
        with Locations((-1.05, 7.2)):
            Circle(SKETCH24_R)
    cut_extrude12_tool1 = split(extrude(cut_extrude12_sk1.sketch, amount=-CUT_EXTRUDE12_REACH, mode=Mode.PRIVATE), bisect_by=cut_extrude12_end, keep=Keep.BOTH, mode=Mode.PRIVATE)
    # Sketch24 → Cut-Extrude12 (cut, up to the picked face)
    with BuildSketch(Plane(origin=(0, 0, -13.4), x_dir=(-1, 0, 0), z_dir=(0, 0, -1)), mode=Mode.PRIVATE) as cut_extrude12_sk2:
        with Locations((-1.05, -2.6)):
            Circle(SKETCH24_R)
    cut_extrude12_tool2 = split(extrude(cut_extrude12_sk2.sketch, amount=-CUT_EXTRUDE12_REACH, mode=Mode.PRIVATE), bisect_by=cut_extrude12_end, keep=Keep.BOTH, mode=Mode.PRIVATE)
    # Sketch24 → Cut-Extrude12 (cut, up to the picked face)
    with BuildSketch(Plane(origin=(0, 0, -13.4), x_dir=(-1, 0, 0), z_dir=(0, 0, -1)), mode=Mode.PRIVATE) as cut_extrude12_sk3:
        with Locations((-10.65, -2.6)):
            Circle(SKETCH24_R)
    cut_extrude12_tool3 = split(extrude(cut_extrude12_sk3.sketch, amount=-CUT_EXTRUDE12_REACH, mode=Mode.PRIVATE), bisect_by=cut_extrude12_end, keep=Keep.BOTH, mode=Mode.PRIVATE)
    add(cut_extrude12_tool1.solids().sort_by(Axis((1.05, 7.2, -13.4), (0, 0, 1)))[0], mode=Mode.SUBTRACT)
    add(cut_extrude12_tool2.solids().sort_by(Axis((1.05, -2.6, -13.4), (0, 0, 1)))[0], mode=Mode.SUBTRACT)
    add(cut_extrude12_tool3.solids().sort_by(Axis((10.65, -2.6, -13.4), (0, 0, 1)))[0], mode=Mode.SUBTRACT)

    # Sketch25 → Boss-Extrude9 (add)
    with BuildSketch(Plane.XY.offset(4.8)):
        with Locations(Location((1.05, -2.6, 0), (0, 0, 180))):
            Circle(SKETCH25_R)
    extrude(amount=-BOSS_EXTRUDE9_DEPTH)


solid = body_2.part
